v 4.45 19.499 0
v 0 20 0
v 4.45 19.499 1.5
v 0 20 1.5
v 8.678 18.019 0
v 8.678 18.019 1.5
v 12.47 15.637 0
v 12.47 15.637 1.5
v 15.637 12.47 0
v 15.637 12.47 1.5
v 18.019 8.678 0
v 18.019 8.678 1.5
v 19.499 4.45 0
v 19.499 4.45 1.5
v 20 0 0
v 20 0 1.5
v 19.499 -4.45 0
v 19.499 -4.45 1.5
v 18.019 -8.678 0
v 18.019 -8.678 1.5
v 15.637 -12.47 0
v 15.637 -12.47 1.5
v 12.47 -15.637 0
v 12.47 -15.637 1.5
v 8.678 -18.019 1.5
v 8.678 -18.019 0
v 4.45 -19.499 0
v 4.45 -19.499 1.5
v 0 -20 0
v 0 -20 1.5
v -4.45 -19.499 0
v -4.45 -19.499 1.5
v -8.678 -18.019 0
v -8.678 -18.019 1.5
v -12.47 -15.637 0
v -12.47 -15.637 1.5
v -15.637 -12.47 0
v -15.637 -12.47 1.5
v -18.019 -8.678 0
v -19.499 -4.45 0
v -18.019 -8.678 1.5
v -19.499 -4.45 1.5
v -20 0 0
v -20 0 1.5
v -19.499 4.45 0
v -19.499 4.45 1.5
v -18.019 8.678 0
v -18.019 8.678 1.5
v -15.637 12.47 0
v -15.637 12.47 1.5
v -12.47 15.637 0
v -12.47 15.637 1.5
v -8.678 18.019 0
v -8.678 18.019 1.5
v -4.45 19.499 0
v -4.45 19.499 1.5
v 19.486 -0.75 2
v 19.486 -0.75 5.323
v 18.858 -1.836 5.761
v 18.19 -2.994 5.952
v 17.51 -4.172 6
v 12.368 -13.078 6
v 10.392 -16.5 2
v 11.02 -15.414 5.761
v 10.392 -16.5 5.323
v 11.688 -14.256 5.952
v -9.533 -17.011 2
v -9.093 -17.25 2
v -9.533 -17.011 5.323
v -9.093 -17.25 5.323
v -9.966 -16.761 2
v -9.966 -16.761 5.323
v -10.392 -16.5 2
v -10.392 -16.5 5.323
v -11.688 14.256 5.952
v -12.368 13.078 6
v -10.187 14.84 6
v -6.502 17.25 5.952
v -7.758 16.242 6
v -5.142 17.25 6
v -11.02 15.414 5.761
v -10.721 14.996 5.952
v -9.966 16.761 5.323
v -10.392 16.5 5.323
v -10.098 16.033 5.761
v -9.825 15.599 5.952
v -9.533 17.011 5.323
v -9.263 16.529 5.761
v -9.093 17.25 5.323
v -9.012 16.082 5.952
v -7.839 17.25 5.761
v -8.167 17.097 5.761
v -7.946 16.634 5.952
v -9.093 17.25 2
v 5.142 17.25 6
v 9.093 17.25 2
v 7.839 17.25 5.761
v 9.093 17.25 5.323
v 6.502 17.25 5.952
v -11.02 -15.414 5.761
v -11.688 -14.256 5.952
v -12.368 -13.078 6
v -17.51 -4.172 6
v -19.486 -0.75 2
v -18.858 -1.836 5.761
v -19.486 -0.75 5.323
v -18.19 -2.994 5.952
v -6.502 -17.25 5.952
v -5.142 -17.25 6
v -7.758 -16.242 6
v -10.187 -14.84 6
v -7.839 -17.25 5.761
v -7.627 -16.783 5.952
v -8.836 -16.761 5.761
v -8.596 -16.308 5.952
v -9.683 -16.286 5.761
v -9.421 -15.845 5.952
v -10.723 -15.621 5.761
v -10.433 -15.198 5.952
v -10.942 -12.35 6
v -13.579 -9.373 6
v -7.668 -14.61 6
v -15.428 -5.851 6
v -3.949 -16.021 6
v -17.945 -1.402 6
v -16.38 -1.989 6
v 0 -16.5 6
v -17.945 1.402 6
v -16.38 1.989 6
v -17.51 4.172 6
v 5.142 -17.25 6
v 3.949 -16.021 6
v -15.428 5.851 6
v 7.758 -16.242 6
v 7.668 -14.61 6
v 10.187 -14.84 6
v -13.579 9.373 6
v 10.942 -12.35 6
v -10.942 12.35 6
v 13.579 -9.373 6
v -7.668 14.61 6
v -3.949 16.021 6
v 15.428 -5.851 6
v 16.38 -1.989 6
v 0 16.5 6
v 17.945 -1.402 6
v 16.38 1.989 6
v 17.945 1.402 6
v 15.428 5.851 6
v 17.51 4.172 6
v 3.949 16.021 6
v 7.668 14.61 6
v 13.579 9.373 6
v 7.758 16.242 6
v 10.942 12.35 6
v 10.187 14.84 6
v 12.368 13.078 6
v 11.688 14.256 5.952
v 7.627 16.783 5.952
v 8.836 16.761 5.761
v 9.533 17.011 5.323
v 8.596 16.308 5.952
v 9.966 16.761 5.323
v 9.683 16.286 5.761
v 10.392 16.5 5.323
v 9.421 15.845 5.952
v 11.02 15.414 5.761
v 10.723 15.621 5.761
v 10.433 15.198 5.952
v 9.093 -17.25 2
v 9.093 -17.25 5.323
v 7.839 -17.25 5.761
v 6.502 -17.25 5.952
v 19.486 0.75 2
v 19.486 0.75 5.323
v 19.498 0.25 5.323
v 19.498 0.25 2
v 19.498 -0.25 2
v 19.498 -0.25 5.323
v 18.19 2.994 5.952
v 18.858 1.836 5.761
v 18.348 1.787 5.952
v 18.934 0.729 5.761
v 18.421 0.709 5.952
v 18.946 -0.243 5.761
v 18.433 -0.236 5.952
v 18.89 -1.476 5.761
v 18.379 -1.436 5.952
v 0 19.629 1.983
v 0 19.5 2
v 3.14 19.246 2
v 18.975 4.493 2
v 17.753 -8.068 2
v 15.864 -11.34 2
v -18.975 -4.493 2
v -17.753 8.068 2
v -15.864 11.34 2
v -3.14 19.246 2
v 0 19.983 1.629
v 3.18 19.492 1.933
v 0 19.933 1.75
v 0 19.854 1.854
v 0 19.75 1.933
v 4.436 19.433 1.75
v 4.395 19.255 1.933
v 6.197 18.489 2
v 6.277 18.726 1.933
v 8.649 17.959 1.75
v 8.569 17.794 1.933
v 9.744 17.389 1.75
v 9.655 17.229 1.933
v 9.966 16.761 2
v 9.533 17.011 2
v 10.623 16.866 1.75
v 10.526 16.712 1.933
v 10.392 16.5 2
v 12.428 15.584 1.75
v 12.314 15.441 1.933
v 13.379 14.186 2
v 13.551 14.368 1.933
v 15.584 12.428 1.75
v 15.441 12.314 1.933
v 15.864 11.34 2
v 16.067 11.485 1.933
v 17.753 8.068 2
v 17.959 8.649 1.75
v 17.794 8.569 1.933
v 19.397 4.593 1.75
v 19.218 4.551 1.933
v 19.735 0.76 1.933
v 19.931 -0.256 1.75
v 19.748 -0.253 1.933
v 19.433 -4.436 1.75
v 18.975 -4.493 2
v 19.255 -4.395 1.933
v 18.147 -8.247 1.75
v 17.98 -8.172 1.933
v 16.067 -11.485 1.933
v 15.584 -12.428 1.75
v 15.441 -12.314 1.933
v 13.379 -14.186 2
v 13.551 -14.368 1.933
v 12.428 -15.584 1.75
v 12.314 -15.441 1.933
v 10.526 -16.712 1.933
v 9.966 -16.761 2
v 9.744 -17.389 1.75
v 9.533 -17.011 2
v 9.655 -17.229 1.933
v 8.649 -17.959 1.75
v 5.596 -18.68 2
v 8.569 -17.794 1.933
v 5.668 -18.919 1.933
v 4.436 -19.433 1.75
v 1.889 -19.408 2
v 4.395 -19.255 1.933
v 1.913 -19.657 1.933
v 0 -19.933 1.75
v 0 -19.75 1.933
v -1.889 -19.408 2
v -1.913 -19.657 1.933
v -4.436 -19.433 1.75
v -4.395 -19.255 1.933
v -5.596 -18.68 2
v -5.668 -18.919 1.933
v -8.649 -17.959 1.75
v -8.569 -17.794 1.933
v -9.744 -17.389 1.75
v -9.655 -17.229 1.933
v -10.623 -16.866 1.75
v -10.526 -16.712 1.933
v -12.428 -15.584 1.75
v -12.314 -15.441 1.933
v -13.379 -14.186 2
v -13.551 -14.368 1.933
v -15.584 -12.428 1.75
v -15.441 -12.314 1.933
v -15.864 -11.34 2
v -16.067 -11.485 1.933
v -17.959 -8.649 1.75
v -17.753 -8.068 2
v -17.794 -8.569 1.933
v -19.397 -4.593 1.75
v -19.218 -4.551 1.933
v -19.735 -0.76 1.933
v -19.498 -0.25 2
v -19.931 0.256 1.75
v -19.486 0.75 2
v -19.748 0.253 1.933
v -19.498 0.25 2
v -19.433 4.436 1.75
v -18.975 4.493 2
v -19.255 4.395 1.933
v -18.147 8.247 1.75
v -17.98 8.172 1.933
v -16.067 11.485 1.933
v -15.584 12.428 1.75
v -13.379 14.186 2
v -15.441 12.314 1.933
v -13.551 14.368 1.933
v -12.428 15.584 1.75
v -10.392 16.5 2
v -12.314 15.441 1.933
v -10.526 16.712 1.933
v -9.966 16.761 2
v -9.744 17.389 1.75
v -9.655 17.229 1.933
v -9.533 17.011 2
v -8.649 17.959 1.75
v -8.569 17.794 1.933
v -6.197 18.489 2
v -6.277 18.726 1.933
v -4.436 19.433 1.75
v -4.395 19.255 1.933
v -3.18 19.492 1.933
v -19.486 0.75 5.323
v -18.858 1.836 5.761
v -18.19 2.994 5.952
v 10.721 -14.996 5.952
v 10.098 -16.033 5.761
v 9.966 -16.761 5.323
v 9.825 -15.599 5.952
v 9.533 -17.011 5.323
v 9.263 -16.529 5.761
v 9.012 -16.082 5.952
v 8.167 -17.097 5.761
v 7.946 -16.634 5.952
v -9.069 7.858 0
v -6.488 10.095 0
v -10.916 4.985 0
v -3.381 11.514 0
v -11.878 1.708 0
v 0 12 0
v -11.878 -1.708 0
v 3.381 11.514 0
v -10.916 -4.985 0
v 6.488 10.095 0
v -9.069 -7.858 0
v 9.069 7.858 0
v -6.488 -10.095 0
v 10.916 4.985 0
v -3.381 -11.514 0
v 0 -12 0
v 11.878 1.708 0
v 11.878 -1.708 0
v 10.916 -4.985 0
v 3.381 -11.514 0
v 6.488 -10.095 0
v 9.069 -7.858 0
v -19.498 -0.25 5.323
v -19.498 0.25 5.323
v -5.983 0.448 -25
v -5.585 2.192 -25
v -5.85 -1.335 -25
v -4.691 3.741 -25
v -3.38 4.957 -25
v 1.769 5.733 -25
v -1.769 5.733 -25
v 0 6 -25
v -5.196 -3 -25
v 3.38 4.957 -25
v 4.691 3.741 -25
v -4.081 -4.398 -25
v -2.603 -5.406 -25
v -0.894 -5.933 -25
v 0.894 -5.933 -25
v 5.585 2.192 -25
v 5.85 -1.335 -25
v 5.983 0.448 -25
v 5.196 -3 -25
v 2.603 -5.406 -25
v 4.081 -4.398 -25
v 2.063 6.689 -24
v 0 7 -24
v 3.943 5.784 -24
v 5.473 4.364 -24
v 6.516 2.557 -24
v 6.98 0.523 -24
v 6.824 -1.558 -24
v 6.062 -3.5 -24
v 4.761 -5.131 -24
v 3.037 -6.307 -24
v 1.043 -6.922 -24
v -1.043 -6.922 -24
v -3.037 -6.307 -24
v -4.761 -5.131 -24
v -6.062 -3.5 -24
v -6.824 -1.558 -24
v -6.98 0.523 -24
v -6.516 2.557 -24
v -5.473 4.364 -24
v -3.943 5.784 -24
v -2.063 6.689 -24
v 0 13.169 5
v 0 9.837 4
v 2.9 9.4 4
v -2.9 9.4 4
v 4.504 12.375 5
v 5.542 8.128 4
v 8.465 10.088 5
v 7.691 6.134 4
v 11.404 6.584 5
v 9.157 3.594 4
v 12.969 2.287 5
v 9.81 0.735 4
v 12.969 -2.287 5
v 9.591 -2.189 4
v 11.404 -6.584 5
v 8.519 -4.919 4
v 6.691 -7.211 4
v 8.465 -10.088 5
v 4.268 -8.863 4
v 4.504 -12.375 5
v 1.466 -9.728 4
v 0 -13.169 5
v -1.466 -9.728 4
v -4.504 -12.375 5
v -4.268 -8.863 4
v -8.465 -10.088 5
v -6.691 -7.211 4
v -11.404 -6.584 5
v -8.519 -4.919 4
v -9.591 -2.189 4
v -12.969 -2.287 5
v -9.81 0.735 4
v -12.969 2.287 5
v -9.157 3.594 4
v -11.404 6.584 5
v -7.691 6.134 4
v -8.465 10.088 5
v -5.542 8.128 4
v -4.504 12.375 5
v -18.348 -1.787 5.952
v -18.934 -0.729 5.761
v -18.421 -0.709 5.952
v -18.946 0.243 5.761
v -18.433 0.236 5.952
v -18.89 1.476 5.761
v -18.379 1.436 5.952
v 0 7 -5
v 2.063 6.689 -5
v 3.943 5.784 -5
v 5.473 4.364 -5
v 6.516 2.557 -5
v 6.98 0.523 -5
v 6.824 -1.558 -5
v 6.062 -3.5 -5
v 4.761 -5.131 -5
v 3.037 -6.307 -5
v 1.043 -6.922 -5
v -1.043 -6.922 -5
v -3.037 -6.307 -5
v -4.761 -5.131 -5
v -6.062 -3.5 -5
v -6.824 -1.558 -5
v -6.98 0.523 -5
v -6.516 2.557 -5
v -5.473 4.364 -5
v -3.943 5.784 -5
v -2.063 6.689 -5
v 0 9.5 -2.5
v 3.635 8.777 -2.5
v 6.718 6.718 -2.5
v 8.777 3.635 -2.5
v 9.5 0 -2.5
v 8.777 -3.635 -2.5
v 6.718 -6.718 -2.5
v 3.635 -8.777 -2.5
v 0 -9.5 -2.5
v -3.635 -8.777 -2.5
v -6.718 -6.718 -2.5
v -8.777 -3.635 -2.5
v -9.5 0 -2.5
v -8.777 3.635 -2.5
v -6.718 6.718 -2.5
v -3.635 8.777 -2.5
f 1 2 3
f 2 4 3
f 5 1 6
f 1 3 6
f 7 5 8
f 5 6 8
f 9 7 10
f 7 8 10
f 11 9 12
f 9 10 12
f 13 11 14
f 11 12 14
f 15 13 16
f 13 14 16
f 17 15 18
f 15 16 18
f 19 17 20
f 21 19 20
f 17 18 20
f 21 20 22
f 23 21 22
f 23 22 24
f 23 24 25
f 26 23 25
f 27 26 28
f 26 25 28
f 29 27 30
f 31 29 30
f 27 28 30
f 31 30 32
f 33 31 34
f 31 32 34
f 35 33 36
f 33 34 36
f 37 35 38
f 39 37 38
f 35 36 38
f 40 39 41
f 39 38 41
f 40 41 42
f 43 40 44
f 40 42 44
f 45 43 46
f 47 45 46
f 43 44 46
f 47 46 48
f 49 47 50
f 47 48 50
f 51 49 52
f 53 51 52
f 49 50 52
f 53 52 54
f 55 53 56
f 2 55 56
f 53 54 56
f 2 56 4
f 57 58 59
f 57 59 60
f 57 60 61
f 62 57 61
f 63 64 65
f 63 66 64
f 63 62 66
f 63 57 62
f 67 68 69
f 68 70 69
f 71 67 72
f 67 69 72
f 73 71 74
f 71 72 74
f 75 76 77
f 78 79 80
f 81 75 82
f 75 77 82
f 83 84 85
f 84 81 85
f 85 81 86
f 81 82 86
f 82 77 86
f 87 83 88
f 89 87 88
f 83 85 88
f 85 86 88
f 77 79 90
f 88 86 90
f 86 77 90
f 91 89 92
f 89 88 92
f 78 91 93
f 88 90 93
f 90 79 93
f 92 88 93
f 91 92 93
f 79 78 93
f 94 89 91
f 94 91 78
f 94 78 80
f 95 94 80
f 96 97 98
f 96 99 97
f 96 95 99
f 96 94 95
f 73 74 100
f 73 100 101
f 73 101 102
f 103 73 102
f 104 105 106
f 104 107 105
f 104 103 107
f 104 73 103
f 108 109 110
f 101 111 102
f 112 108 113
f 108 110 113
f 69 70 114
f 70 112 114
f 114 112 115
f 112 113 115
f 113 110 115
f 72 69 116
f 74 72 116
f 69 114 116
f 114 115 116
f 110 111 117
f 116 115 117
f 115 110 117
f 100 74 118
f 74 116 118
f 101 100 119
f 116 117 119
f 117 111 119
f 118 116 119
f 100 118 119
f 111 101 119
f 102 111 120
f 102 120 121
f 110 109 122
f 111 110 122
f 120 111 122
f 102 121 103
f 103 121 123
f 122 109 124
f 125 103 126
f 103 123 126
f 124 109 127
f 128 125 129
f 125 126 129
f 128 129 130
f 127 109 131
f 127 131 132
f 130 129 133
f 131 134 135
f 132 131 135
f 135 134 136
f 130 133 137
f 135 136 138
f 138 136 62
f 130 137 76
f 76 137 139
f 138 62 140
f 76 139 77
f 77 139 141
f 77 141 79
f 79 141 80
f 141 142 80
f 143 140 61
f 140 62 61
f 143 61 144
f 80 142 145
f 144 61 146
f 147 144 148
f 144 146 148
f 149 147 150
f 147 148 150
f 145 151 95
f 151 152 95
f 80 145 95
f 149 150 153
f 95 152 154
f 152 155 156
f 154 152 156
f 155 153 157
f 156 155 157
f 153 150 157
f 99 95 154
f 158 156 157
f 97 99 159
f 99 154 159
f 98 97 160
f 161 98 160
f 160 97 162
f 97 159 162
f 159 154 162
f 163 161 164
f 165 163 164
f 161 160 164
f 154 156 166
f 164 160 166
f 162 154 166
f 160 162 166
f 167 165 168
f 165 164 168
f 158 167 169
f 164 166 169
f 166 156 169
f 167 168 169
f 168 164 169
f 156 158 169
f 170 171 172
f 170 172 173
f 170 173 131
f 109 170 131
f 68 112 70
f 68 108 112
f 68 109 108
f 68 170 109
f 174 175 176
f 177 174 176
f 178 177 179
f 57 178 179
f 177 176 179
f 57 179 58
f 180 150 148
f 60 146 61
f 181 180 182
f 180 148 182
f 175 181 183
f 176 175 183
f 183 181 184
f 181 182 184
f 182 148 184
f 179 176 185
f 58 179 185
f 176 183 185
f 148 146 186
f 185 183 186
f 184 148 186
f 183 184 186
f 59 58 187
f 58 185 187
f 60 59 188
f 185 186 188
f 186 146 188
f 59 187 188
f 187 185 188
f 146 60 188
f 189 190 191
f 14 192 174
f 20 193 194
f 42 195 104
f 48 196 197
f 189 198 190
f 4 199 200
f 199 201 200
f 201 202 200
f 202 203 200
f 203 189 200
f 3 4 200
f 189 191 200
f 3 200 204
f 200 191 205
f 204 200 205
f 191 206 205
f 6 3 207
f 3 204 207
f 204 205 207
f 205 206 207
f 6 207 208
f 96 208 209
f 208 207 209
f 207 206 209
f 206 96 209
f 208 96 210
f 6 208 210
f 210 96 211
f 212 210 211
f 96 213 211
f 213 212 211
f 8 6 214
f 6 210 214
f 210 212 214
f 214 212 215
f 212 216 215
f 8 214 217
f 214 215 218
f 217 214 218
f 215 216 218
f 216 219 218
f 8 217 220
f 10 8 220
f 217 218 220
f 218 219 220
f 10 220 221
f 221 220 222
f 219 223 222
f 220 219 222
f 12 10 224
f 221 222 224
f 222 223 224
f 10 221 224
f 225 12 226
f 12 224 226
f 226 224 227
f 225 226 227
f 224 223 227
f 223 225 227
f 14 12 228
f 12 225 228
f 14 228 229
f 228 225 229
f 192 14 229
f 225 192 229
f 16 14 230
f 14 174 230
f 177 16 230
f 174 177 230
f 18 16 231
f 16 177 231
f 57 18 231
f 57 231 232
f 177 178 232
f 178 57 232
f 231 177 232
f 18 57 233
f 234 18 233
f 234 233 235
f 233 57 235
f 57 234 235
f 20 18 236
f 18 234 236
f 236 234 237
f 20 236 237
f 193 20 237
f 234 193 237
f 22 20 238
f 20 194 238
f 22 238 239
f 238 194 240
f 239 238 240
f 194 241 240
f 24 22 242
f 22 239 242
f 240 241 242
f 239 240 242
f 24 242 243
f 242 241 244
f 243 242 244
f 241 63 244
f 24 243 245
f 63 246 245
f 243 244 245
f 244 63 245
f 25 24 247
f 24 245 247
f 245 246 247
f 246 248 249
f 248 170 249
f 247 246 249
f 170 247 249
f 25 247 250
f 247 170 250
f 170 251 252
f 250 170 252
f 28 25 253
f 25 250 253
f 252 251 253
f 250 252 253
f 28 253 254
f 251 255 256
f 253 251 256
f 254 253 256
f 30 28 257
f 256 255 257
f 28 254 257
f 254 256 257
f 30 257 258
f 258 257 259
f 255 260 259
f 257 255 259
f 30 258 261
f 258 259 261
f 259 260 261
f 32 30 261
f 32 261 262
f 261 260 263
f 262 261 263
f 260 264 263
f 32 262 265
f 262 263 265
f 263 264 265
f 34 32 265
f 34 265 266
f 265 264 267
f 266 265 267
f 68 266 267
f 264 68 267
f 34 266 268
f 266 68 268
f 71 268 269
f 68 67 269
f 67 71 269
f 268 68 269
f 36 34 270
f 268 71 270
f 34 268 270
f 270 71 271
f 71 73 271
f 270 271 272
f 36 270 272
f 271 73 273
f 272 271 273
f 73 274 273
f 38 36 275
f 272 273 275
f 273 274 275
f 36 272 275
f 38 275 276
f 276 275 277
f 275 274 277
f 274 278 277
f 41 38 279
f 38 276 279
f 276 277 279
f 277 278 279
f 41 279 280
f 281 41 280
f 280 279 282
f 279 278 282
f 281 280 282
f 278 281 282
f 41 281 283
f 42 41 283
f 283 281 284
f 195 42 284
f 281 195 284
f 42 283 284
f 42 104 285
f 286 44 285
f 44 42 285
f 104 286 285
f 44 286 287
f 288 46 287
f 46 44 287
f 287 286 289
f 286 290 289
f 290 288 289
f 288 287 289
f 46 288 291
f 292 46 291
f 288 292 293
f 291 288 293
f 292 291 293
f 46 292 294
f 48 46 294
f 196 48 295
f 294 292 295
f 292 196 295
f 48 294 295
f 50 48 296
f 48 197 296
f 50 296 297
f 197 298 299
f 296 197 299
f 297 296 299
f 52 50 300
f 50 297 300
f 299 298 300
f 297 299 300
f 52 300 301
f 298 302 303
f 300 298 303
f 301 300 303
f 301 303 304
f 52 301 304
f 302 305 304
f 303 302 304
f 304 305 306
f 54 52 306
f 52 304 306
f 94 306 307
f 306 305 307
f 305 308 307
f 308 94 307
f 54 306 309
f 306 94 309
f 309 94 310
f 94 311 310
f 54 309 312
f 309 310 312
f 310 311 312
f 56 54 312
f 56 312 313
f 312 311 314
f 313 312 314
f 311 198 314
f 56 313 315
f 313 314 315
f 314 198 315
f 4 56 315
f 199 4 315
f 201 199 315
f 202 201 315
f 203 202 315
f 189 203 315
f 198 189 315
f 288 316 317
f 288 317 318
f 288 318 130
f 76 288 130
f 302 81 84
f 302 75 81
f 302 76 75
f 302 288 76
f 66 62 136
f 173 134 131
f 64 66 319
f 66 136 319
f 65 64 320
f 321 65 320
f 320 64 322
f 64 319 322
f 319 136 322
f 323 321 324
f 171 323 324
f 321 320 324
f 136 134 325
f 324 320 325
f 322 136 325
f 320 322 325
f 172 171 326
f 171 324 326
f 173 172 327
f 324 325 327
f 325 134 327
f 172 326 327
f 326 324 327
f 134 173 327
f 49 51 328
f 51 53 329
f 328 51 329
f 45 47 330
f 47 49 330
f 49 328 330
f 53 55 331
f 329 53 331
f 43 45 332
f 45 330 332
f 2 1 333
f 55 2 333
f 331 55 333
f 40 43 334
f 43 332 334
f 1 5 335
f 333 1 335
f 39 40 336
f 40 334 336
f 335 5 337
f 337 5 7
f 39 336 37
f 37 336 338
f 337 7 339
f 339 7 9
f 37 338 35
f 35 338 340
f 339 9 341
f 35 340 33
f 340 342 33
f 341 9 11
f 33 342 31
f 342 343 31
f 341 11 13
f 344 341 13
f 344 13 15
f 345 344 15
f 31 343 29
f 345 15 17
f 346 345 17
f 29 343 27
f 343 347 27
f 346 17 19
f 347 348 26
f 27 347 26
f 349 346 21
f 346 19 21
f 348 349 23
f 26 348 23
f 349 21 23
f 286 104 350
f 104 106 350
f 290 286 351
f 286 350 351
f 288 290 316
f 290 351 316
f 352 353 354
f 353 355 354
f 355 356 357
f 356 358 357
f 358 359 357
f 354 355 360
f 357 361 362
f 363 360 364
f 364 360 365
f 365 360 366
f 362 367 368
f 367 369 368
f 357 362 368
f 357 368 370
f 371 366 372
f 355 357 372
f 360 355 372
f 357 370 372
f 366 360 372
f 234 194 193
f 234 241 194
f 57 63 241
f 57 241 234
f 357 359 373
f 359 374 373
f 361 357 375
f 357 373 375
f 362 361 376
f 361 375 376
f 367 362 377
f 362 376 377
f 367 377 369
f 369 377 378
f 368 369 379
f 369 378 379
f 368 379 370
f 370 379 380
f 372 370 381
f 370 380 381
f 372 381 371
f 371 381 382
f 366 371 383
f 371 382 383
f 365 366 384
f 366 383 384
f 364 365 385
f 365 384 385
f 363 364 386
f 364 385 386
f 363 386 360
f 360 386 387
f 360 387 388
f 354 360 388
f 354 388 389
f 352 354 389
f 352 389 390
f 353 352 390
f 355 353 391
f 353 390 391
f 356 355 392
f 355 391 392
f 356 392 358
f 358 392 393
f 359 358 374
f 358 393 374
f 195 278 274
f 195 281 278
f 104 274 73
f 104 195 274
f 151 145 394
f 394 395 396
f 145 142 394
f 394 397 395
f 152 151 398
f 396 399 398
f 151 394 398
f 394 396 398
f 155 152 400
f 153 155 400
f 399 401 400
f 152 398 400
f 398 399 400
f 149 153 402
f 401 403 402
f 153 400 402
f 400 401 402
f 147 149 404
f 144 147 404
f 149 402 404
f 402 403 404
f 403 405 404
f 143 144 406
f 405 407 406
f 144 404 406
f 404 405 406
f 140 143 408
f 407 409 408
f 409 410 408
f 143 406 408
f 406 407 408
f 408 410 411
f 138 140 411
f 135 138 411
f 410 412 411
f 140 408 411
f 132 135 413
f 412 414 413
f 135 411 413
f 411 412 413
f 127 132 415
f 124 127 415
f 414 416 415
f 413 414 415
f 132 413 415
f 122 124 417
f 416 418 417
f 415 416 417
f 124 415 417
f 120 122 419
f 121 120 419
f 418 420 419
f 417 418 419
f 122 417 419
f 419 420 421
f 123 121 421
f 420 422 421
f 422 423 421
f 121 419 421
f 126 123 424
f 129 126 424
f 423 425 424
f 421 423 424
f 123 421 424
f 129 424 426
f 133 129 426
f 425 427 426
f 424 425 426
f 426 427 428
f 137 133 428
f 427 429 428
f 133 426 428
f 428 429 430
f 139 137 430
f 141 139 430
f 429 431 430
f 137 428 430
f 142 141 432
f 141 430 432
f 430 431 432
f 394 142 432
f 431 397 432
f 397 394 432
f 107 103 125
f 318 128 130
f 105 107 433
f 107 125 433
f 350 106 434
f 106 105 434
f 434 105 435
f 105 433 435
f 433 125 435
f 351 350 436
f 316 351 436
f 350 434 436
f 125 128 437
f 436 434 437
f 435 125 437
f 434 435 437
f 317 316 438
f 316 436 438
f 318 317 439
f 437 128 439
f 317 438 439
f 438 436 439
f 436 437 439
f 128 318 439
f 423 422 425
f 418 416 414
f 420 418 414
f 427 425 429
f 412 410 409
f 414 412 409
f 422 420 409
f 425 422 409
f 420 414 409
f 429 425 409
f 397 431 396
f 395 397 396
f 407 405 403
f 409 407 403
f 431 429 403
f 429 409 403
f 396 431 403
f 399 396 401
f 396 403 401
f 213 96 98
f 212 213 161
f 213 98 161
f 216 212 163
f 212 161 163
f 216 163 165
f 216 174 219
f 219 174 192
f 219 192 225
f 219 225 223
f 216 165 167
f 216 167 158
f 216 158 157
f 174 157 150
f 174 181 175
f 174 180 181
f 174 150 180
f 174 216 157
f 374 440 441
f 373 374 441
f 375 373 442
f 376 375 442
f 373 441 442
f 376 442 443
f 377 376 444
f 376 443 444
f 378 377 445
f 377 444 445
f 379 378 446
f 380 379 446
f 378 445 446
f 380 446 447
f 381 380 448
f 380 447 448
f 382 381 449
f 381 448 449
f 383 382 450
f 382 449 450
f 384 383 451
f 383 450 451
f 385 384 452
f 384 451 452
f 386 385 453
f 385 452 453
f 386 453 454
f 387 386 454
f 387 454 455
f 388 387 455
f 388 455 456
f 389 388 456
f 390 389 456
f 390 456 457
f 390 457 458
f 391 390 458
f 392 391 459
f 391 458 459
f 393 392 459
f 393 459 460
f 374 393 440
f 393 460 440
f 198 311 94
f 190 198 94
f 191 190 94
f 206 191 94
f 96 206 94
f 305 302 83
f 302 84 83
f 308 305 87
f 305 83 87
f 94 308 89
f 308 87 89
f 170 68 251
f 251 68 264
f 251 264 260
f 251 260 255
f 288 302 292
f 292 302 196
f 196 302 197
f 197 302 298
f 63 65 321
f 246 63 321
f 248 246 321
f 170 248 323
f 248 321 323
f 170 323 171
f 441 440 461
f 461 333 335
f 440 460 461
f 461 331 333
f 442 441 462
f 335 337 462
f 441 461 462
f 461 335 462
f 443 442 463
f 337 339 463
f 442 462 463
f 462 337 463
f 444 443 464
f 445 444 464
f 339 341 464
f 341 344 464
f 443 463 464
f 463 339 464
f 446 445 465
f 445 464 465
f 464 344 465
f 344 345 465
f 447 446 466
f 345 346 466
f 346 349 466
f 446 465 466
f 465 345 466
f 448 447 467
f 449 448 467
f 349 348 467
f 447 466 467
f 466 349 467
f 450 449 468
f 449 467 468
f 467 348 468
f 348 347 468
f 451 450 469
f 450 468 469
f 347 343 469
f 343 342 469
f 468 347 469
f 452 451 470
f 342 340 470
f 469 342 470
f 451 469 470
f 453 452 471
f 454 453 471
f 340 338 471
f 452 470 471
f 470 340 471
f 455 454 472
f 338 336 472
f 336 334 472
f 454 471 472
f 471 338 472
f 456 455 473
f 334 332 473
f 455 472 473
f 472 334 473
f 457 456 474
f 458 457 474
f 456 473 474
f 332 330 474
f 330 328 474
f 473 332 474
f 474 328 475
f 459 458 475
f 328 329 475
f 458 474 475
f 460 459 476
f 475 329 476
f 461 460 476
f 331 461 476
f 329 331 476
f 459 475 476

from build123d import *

# Parameters (mm, degrees)
F3_R     = 21.863544
F4_DEPTH = 6
F5_SIZE  = 5


with BuildPart() as f2:
    # F1 (on Right) → F2 (revolve)
    with BuildSketch(Plane.YZ):
        with BuildLine():
            Line((0, 4), (0, -25))
            Line((0, -25), (6, -25))
            Line((6, -25), (7, -24))
            Line((7, -24), (7, 0))
            Line((7, 0), (20, 0))
            Line((20, 0), (20, 1.5))
            ThreePointArc((20, 1.5), (19.853553, 1.853553), (19.5, 2))
            Line((19.5, 2), (19.5, 5.322876))
            ThreePointArc((19.5, 5.322876), (18.822876, 5.822876), (18, 6))
            Line((18, 6), (16.5, 6))
            Line((16.5, 6), (9.837409, 4))
            Line((9.837409, 4), (0, 4))
        make_face()
    revolve(axis=Axis((0, 0, -10.5), (0, 0, -1)))

    # F3 (on offset) → F4 (cut)
    with BuildSketch(Plane.XY.offset(2)):
        Circle(F3_R)
        Polygon((-19.918584, 0), (-9.959292, 17.25), (9.959292, 17.25), (19.918584, 0), (9.959292, -17.25), (-9.959292, -17.25), align=None, mode=Mode.SUBTRACT)
    extrude(amount=F4_DEPTH, mode=Mode.SUBTRACT)

    # F5
    f5_edges = [f2.edges().sort_by_distance(p)[0] for p in [
        (0, -7, 0),
    ]]
    chamfer(f5_edges, length=F5_SIZE)


solid = f2.part
